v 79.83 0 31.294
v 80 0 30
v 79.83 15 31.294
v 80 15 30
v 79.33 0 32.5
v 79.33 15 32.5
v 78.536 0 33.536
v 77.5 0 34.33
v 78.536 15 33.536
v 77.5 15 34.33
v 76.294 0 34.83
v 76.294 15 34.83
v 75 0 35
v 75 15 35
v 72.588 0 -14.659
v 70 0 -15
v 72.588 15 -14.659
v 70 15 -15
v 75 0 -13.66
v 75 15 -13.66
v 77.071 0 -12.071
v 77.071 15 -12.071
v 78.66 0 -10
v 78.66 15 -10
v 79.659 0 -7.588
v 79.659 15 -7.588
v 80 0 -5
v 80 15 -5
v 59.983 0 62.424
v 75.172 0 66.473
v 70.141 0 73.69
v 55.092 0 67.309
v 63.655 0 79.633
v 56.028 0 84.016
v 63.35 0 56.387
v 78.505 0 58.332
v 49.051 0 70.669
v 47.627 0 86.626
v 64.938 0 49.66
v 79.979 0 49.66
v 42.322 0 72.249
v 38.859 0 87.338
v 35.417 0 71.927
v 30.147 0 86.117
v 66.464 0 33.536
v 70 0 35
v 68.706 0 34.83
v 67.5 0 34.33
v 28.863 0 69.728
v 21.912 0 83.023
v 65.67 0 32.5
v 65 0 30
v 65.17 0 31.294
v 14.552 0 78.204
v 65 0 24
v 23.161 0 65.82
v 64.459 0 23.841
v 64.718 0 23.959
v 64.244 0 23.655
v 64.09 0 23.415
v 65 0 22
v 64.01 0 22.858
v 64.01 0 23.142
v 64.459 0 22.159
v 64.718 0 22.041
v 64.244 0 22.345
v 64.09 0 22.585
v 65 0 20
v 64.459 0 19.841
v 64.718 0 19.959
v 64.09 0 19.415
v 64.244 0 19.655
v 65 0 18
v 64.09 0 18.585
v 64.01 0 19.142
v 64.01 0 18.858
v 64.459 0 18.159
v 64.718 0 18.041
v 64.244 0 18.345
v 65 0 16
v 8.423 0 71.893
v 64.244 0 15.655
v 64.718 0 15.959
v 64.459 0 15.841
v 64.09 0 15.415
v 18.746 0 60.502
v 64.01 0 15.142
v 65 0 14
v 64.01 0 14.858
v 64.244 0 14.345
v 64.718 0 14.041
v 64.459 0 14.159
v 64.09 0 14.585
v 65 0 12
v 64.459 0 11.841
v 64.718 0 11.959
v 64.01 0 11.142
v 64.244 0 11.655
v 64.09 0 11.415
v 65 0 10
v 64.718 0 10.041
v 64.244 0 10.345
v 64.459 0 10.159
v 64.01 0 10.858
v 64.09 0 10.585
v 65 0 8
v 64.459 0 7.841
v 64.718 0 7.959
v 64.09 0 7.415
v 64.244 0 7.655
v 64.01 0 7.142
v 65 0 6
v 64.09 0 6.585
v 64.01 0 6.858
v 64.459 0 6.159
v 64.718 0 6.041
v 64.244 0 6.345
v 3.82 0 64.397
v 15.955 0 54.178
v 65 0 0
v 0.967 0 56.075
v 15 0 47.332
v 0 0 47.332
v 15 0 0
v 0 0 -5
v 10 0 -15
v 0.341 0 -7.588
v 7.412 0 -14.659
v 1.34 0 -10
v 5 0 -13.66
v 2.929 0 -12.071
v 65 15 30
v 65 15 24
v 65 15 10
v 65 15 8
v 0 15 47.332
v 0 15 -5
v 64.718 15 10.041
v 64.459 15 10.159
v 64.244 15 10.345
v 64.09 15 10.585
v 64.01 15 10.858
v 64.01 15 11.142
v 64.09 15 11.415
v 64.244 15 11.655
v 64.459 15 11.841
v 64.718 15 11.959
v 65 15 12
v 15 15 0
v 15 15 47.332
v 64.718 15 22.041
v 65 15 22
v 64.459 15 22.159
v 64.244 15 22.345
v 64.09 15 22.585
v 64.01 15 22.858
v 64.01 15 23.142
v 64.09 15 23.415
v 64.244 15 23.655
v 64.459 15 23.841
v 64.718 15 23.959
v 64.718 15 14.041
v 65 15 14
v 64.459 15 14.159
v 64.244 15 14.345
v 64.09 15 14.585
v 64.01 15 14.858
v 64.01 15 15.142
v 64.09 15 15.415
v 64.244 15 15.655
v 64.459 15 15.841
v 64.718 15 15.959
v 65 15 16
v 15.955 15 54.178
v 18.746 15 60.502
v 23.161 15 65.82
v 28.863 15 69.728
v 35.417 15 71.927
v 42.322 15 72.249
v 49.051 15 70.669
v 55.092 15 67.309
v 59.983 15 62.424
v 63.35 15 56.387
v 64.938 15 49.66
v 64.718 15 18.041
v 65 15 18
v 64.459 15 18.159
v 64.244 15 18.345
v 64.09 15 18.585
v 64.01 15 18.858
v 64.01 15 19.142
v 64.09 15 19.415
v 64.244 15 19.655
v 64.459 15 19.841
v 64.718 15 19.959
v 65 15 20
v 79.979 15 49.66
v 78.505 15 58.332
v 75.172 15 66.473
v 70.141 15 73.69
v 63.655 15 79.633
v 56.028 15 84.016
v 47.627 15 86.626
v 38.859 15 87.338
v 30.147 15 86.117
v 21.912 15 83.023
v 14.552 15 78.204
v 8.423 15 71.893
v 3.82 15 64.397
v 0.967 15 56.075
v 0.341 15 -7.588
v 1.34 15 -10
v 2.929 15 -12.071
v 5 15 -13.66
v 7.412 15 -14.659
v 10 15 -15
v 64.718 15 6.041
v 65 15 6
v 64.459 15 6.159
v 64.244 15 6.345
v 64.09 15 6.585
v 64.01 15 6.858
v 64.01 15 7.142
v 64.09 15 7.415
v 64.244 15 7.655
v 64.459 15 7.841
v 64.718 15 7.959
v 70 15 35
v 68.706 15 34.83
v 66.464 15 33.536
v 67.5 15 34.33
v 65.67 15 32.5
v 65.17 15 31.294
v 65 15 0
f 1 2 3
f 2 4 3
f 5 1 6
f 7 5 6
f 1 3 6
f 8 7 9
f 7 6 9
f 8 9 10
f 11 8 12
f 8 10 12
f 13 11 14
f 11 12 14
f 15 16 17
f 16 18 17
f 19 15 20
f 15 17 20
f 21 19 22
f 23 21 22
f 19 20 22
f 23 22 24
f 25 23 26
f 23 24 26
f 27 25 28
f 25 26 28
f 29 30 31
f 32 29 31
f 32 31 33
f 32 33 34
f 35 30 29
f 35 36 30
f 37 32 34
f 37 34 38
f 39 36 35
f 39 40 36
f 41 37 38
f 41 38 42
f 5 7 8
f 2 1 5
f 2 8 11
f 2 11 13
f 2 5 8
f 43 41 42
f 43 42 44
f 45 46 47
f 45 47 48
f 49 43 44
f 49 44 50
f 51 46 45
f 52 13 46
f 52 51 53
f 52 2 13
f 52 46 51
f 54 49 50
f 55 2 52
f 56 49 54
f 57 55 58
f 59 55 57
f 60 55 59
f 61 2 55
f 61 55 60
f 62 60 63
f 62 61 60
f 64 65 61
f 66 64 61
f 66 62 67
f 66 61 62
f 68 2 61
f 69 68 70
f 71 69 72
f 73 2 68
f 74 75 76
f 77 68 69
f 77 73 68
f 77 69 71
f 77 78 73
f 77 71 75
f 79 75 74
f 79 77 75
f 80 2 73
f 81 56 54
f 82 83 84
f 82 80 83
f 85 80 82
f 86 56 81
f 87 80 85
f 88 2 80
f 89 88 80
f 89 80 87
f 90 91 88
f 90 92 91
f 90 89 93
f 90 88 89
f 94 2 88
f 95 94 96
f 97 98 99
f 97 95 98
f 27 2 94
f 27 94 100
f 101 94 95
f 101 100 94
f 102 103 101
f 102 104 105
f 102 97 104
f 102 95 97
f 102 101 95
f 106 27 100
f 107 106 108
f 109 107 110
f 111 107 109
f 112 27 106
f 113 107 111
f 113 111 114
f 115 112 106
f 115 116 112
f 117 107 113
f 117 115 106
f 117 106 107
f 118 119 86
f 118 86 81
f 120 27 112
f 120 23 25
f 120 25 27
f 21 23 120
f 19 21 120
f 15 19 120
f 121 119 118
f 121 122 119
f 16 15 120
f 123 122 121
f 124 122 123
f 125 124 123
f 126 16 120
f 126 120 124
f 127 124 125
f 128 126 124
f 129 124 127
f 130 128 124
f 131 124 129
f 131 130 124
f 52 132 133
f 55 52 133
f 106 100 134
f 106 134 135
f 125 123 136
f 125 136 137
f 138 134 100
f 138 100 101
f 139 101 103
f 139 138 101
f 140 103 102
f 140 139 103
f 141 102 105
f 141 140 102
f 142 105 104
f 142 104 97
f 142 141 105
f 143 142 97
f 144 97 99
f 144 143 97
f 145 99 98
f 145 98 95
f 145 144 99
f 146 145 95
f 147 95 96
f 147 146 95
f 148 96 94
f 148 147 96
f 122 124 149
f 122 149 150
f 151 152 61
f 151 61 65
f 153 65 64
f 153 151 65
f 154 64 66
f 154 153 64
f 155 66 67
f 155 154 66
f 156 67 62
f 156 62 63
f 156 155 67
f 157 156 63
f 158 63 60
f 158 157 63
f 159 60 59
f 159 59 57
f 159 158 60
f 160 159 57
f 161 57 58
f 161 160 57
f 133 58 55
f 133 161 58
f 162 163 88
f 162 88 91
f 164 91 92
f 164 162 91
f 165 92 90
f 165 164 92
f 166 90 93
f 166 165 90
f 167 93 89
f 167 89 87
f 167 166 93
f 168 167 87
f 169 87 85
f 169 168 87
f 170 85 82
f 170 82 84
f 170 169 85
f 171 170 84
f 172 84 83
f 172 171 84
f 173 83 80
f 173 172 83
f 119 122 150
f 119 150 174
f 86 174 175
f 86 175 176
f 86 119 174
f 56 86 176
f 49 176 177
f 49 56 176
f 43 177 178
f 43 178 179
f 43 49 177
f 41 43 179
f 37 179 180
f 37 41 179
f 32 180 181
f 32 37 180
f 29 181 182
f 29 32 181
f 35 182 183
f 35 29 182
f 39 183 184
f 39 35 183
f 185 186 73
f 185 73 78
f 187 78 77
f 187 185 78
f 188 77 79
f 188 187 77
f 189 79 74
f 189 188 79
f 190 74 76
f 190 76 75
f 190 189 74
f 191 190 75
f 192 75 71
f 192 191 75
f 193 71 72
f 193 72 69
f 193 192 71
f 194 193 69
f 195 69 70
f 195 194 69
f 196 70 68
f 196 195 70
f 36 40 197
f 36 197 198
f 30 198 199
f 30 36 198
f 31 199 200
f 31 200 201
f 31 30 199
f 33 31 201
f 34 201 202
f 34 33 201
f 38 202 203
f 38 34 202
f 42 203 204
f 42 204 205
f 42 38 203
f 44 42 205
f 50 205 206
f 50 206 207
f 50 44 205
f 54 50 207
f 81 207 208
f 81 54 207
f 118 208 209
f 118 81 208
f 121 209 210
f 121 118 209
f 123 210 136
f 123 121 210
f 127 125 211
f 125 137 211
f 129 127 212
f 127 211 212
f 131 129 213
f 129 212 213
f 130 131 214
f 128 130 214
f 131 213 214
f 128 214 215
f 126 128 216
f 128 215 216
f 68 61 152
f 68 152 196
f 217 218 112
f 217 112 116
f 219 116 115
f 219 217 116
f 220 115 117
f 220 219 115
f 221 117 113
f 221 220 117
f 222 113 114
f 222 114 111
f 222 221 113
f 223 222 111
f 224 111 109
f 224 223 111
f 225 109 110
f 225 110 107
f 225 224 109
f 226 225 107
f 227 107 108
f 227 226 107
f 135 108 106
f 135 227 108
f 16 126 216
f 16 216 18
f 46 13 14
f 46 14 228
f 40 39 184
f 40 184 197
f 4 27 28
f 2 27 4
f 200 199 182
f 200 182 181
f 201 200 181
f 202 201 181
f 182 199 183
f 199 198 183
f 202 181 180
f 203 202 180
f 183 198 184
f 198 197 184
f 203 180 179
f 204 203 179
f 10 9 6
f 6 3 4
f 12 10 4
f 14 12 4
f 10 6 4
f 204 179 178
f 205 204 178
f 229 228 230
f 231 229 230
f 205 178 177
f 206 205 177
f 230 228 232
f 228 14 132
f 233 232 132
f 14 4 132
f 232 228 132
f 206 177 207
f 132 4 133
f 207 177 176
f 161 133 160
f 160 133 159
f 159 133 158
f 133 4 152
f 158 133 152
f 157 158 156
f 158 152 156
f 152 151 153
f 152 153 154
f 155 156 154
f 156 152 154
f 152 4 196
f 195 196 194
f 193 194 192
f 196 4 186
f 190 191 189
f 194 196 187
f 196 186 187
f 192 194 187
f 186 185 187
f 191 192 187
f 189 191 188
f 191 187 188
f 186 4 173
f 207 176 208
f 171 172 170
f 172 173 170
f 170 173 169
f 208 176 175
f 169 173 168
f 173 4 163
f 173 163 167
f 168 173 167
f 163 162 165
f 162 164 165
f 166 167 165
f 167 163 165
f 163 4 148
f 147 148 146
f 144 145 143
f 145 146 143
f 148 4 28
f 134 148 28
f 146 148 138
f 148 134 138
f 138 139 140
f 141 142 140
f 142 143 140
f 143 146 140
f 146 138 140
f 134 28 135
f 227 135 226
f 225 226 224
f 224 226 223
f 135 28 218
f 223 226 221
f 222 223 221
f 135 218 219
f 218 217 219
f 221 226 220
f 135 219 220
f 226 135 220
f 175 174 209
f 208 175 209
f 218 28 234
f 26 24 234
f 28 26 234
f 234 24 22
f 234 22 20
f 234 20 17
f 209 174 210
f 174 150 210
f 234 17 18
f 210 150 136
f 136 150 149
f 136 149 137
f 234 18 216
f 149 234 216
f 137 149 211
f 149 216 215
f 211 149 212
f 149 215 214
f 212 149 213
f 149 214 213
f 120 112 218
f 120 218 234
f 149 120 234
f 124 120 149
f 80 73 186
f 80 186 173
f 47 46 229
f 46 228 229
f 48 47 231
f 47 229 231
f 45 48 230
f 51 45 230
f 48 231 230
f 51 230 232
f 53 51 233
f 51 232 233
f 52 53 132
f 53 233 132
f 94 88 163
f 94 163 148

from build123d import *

# Parameters (mm, degrees)
BOSS_EXTRUDE1_DEPTH = 15
FILLET2_R           = 10
FILLET3_R           = 5
SKETCH3_R           = 1
BOSS_EXTRUDE2_DEPTH = 15


with BuildPart() as part:
    # Sketch2 → Boss-Extrude1 (new body)
    with BuildSketch(Plane(origin=(0, 0, 0), x_dir=(1, 0, 0), z_dir=(0, 1, 0))):
        with BuildLine():
            Line((64.937954364, -49.659577053), (79.978719708, -49.659577053))
            ThreePointArc((79.978719708, -49.659577053), (38.858723791, -87.337822877), (0, -47.331525149))
            Line((0, -47.331525149), (0, 0))
            Line((0, 0), (0, 15))
            Line((0, 15), (80, 15))
            Line((80, 15), (80, 0))
            Line((80, 0), (80, -35))
            Line((80, -35), (65, -35))
            Line((65, -35), (65, 0))
            Line((65, 0), (15, 0))
            Line((15, 0), (15, -47.331525149))
            ThreePointArc((15, -47.331525149), (38.857952611, -72.327620402), (64.937954364, -49.659577053))
        make_face()
    extrude(amount=BOSS_EXTRUDE1_DEPTH)

    # Fillet2
    fillet2_edges = [part.edges().sort_by_distance(p)[0] for p in [
        (0, 7.5, -15),
        (80, 7.5, -15),
    ]]
    fillet(fillet2_edges, radius=FILLET2_R)

    # Fillet3
    fillet3_edges = [part.edges().sort_by_distance(p)[0] for p in [
        (80, 7.5, 35),
        (65, 7.5, 35),
    ]]
    fillet(fillet3_edges, radius=FILLET3_R)

    # Sketch3 → Boss-Extrude2 (add)
    with BuildSketch(Plane(origin=(0, 15, 0), x_dir=(1, 0, 0), z_dir=(0, 1, 0))):
        with Locations((65, -15)):
            Circle(SKETCH3_R)
        with Locations((65, -11)):
            Circle(SKETCH3_R)
        with Locations((65, -23)):
            Circle(SKETCH3_R)
        with Locations((65, -19)):
            Circle(SKETCH3_R)
        with Locations((65, -7)):
            Circle(SKETCH3_R)
    extrude(amount=-BOSS_EXTRUDE2_DEPTH)


solid = part.part
